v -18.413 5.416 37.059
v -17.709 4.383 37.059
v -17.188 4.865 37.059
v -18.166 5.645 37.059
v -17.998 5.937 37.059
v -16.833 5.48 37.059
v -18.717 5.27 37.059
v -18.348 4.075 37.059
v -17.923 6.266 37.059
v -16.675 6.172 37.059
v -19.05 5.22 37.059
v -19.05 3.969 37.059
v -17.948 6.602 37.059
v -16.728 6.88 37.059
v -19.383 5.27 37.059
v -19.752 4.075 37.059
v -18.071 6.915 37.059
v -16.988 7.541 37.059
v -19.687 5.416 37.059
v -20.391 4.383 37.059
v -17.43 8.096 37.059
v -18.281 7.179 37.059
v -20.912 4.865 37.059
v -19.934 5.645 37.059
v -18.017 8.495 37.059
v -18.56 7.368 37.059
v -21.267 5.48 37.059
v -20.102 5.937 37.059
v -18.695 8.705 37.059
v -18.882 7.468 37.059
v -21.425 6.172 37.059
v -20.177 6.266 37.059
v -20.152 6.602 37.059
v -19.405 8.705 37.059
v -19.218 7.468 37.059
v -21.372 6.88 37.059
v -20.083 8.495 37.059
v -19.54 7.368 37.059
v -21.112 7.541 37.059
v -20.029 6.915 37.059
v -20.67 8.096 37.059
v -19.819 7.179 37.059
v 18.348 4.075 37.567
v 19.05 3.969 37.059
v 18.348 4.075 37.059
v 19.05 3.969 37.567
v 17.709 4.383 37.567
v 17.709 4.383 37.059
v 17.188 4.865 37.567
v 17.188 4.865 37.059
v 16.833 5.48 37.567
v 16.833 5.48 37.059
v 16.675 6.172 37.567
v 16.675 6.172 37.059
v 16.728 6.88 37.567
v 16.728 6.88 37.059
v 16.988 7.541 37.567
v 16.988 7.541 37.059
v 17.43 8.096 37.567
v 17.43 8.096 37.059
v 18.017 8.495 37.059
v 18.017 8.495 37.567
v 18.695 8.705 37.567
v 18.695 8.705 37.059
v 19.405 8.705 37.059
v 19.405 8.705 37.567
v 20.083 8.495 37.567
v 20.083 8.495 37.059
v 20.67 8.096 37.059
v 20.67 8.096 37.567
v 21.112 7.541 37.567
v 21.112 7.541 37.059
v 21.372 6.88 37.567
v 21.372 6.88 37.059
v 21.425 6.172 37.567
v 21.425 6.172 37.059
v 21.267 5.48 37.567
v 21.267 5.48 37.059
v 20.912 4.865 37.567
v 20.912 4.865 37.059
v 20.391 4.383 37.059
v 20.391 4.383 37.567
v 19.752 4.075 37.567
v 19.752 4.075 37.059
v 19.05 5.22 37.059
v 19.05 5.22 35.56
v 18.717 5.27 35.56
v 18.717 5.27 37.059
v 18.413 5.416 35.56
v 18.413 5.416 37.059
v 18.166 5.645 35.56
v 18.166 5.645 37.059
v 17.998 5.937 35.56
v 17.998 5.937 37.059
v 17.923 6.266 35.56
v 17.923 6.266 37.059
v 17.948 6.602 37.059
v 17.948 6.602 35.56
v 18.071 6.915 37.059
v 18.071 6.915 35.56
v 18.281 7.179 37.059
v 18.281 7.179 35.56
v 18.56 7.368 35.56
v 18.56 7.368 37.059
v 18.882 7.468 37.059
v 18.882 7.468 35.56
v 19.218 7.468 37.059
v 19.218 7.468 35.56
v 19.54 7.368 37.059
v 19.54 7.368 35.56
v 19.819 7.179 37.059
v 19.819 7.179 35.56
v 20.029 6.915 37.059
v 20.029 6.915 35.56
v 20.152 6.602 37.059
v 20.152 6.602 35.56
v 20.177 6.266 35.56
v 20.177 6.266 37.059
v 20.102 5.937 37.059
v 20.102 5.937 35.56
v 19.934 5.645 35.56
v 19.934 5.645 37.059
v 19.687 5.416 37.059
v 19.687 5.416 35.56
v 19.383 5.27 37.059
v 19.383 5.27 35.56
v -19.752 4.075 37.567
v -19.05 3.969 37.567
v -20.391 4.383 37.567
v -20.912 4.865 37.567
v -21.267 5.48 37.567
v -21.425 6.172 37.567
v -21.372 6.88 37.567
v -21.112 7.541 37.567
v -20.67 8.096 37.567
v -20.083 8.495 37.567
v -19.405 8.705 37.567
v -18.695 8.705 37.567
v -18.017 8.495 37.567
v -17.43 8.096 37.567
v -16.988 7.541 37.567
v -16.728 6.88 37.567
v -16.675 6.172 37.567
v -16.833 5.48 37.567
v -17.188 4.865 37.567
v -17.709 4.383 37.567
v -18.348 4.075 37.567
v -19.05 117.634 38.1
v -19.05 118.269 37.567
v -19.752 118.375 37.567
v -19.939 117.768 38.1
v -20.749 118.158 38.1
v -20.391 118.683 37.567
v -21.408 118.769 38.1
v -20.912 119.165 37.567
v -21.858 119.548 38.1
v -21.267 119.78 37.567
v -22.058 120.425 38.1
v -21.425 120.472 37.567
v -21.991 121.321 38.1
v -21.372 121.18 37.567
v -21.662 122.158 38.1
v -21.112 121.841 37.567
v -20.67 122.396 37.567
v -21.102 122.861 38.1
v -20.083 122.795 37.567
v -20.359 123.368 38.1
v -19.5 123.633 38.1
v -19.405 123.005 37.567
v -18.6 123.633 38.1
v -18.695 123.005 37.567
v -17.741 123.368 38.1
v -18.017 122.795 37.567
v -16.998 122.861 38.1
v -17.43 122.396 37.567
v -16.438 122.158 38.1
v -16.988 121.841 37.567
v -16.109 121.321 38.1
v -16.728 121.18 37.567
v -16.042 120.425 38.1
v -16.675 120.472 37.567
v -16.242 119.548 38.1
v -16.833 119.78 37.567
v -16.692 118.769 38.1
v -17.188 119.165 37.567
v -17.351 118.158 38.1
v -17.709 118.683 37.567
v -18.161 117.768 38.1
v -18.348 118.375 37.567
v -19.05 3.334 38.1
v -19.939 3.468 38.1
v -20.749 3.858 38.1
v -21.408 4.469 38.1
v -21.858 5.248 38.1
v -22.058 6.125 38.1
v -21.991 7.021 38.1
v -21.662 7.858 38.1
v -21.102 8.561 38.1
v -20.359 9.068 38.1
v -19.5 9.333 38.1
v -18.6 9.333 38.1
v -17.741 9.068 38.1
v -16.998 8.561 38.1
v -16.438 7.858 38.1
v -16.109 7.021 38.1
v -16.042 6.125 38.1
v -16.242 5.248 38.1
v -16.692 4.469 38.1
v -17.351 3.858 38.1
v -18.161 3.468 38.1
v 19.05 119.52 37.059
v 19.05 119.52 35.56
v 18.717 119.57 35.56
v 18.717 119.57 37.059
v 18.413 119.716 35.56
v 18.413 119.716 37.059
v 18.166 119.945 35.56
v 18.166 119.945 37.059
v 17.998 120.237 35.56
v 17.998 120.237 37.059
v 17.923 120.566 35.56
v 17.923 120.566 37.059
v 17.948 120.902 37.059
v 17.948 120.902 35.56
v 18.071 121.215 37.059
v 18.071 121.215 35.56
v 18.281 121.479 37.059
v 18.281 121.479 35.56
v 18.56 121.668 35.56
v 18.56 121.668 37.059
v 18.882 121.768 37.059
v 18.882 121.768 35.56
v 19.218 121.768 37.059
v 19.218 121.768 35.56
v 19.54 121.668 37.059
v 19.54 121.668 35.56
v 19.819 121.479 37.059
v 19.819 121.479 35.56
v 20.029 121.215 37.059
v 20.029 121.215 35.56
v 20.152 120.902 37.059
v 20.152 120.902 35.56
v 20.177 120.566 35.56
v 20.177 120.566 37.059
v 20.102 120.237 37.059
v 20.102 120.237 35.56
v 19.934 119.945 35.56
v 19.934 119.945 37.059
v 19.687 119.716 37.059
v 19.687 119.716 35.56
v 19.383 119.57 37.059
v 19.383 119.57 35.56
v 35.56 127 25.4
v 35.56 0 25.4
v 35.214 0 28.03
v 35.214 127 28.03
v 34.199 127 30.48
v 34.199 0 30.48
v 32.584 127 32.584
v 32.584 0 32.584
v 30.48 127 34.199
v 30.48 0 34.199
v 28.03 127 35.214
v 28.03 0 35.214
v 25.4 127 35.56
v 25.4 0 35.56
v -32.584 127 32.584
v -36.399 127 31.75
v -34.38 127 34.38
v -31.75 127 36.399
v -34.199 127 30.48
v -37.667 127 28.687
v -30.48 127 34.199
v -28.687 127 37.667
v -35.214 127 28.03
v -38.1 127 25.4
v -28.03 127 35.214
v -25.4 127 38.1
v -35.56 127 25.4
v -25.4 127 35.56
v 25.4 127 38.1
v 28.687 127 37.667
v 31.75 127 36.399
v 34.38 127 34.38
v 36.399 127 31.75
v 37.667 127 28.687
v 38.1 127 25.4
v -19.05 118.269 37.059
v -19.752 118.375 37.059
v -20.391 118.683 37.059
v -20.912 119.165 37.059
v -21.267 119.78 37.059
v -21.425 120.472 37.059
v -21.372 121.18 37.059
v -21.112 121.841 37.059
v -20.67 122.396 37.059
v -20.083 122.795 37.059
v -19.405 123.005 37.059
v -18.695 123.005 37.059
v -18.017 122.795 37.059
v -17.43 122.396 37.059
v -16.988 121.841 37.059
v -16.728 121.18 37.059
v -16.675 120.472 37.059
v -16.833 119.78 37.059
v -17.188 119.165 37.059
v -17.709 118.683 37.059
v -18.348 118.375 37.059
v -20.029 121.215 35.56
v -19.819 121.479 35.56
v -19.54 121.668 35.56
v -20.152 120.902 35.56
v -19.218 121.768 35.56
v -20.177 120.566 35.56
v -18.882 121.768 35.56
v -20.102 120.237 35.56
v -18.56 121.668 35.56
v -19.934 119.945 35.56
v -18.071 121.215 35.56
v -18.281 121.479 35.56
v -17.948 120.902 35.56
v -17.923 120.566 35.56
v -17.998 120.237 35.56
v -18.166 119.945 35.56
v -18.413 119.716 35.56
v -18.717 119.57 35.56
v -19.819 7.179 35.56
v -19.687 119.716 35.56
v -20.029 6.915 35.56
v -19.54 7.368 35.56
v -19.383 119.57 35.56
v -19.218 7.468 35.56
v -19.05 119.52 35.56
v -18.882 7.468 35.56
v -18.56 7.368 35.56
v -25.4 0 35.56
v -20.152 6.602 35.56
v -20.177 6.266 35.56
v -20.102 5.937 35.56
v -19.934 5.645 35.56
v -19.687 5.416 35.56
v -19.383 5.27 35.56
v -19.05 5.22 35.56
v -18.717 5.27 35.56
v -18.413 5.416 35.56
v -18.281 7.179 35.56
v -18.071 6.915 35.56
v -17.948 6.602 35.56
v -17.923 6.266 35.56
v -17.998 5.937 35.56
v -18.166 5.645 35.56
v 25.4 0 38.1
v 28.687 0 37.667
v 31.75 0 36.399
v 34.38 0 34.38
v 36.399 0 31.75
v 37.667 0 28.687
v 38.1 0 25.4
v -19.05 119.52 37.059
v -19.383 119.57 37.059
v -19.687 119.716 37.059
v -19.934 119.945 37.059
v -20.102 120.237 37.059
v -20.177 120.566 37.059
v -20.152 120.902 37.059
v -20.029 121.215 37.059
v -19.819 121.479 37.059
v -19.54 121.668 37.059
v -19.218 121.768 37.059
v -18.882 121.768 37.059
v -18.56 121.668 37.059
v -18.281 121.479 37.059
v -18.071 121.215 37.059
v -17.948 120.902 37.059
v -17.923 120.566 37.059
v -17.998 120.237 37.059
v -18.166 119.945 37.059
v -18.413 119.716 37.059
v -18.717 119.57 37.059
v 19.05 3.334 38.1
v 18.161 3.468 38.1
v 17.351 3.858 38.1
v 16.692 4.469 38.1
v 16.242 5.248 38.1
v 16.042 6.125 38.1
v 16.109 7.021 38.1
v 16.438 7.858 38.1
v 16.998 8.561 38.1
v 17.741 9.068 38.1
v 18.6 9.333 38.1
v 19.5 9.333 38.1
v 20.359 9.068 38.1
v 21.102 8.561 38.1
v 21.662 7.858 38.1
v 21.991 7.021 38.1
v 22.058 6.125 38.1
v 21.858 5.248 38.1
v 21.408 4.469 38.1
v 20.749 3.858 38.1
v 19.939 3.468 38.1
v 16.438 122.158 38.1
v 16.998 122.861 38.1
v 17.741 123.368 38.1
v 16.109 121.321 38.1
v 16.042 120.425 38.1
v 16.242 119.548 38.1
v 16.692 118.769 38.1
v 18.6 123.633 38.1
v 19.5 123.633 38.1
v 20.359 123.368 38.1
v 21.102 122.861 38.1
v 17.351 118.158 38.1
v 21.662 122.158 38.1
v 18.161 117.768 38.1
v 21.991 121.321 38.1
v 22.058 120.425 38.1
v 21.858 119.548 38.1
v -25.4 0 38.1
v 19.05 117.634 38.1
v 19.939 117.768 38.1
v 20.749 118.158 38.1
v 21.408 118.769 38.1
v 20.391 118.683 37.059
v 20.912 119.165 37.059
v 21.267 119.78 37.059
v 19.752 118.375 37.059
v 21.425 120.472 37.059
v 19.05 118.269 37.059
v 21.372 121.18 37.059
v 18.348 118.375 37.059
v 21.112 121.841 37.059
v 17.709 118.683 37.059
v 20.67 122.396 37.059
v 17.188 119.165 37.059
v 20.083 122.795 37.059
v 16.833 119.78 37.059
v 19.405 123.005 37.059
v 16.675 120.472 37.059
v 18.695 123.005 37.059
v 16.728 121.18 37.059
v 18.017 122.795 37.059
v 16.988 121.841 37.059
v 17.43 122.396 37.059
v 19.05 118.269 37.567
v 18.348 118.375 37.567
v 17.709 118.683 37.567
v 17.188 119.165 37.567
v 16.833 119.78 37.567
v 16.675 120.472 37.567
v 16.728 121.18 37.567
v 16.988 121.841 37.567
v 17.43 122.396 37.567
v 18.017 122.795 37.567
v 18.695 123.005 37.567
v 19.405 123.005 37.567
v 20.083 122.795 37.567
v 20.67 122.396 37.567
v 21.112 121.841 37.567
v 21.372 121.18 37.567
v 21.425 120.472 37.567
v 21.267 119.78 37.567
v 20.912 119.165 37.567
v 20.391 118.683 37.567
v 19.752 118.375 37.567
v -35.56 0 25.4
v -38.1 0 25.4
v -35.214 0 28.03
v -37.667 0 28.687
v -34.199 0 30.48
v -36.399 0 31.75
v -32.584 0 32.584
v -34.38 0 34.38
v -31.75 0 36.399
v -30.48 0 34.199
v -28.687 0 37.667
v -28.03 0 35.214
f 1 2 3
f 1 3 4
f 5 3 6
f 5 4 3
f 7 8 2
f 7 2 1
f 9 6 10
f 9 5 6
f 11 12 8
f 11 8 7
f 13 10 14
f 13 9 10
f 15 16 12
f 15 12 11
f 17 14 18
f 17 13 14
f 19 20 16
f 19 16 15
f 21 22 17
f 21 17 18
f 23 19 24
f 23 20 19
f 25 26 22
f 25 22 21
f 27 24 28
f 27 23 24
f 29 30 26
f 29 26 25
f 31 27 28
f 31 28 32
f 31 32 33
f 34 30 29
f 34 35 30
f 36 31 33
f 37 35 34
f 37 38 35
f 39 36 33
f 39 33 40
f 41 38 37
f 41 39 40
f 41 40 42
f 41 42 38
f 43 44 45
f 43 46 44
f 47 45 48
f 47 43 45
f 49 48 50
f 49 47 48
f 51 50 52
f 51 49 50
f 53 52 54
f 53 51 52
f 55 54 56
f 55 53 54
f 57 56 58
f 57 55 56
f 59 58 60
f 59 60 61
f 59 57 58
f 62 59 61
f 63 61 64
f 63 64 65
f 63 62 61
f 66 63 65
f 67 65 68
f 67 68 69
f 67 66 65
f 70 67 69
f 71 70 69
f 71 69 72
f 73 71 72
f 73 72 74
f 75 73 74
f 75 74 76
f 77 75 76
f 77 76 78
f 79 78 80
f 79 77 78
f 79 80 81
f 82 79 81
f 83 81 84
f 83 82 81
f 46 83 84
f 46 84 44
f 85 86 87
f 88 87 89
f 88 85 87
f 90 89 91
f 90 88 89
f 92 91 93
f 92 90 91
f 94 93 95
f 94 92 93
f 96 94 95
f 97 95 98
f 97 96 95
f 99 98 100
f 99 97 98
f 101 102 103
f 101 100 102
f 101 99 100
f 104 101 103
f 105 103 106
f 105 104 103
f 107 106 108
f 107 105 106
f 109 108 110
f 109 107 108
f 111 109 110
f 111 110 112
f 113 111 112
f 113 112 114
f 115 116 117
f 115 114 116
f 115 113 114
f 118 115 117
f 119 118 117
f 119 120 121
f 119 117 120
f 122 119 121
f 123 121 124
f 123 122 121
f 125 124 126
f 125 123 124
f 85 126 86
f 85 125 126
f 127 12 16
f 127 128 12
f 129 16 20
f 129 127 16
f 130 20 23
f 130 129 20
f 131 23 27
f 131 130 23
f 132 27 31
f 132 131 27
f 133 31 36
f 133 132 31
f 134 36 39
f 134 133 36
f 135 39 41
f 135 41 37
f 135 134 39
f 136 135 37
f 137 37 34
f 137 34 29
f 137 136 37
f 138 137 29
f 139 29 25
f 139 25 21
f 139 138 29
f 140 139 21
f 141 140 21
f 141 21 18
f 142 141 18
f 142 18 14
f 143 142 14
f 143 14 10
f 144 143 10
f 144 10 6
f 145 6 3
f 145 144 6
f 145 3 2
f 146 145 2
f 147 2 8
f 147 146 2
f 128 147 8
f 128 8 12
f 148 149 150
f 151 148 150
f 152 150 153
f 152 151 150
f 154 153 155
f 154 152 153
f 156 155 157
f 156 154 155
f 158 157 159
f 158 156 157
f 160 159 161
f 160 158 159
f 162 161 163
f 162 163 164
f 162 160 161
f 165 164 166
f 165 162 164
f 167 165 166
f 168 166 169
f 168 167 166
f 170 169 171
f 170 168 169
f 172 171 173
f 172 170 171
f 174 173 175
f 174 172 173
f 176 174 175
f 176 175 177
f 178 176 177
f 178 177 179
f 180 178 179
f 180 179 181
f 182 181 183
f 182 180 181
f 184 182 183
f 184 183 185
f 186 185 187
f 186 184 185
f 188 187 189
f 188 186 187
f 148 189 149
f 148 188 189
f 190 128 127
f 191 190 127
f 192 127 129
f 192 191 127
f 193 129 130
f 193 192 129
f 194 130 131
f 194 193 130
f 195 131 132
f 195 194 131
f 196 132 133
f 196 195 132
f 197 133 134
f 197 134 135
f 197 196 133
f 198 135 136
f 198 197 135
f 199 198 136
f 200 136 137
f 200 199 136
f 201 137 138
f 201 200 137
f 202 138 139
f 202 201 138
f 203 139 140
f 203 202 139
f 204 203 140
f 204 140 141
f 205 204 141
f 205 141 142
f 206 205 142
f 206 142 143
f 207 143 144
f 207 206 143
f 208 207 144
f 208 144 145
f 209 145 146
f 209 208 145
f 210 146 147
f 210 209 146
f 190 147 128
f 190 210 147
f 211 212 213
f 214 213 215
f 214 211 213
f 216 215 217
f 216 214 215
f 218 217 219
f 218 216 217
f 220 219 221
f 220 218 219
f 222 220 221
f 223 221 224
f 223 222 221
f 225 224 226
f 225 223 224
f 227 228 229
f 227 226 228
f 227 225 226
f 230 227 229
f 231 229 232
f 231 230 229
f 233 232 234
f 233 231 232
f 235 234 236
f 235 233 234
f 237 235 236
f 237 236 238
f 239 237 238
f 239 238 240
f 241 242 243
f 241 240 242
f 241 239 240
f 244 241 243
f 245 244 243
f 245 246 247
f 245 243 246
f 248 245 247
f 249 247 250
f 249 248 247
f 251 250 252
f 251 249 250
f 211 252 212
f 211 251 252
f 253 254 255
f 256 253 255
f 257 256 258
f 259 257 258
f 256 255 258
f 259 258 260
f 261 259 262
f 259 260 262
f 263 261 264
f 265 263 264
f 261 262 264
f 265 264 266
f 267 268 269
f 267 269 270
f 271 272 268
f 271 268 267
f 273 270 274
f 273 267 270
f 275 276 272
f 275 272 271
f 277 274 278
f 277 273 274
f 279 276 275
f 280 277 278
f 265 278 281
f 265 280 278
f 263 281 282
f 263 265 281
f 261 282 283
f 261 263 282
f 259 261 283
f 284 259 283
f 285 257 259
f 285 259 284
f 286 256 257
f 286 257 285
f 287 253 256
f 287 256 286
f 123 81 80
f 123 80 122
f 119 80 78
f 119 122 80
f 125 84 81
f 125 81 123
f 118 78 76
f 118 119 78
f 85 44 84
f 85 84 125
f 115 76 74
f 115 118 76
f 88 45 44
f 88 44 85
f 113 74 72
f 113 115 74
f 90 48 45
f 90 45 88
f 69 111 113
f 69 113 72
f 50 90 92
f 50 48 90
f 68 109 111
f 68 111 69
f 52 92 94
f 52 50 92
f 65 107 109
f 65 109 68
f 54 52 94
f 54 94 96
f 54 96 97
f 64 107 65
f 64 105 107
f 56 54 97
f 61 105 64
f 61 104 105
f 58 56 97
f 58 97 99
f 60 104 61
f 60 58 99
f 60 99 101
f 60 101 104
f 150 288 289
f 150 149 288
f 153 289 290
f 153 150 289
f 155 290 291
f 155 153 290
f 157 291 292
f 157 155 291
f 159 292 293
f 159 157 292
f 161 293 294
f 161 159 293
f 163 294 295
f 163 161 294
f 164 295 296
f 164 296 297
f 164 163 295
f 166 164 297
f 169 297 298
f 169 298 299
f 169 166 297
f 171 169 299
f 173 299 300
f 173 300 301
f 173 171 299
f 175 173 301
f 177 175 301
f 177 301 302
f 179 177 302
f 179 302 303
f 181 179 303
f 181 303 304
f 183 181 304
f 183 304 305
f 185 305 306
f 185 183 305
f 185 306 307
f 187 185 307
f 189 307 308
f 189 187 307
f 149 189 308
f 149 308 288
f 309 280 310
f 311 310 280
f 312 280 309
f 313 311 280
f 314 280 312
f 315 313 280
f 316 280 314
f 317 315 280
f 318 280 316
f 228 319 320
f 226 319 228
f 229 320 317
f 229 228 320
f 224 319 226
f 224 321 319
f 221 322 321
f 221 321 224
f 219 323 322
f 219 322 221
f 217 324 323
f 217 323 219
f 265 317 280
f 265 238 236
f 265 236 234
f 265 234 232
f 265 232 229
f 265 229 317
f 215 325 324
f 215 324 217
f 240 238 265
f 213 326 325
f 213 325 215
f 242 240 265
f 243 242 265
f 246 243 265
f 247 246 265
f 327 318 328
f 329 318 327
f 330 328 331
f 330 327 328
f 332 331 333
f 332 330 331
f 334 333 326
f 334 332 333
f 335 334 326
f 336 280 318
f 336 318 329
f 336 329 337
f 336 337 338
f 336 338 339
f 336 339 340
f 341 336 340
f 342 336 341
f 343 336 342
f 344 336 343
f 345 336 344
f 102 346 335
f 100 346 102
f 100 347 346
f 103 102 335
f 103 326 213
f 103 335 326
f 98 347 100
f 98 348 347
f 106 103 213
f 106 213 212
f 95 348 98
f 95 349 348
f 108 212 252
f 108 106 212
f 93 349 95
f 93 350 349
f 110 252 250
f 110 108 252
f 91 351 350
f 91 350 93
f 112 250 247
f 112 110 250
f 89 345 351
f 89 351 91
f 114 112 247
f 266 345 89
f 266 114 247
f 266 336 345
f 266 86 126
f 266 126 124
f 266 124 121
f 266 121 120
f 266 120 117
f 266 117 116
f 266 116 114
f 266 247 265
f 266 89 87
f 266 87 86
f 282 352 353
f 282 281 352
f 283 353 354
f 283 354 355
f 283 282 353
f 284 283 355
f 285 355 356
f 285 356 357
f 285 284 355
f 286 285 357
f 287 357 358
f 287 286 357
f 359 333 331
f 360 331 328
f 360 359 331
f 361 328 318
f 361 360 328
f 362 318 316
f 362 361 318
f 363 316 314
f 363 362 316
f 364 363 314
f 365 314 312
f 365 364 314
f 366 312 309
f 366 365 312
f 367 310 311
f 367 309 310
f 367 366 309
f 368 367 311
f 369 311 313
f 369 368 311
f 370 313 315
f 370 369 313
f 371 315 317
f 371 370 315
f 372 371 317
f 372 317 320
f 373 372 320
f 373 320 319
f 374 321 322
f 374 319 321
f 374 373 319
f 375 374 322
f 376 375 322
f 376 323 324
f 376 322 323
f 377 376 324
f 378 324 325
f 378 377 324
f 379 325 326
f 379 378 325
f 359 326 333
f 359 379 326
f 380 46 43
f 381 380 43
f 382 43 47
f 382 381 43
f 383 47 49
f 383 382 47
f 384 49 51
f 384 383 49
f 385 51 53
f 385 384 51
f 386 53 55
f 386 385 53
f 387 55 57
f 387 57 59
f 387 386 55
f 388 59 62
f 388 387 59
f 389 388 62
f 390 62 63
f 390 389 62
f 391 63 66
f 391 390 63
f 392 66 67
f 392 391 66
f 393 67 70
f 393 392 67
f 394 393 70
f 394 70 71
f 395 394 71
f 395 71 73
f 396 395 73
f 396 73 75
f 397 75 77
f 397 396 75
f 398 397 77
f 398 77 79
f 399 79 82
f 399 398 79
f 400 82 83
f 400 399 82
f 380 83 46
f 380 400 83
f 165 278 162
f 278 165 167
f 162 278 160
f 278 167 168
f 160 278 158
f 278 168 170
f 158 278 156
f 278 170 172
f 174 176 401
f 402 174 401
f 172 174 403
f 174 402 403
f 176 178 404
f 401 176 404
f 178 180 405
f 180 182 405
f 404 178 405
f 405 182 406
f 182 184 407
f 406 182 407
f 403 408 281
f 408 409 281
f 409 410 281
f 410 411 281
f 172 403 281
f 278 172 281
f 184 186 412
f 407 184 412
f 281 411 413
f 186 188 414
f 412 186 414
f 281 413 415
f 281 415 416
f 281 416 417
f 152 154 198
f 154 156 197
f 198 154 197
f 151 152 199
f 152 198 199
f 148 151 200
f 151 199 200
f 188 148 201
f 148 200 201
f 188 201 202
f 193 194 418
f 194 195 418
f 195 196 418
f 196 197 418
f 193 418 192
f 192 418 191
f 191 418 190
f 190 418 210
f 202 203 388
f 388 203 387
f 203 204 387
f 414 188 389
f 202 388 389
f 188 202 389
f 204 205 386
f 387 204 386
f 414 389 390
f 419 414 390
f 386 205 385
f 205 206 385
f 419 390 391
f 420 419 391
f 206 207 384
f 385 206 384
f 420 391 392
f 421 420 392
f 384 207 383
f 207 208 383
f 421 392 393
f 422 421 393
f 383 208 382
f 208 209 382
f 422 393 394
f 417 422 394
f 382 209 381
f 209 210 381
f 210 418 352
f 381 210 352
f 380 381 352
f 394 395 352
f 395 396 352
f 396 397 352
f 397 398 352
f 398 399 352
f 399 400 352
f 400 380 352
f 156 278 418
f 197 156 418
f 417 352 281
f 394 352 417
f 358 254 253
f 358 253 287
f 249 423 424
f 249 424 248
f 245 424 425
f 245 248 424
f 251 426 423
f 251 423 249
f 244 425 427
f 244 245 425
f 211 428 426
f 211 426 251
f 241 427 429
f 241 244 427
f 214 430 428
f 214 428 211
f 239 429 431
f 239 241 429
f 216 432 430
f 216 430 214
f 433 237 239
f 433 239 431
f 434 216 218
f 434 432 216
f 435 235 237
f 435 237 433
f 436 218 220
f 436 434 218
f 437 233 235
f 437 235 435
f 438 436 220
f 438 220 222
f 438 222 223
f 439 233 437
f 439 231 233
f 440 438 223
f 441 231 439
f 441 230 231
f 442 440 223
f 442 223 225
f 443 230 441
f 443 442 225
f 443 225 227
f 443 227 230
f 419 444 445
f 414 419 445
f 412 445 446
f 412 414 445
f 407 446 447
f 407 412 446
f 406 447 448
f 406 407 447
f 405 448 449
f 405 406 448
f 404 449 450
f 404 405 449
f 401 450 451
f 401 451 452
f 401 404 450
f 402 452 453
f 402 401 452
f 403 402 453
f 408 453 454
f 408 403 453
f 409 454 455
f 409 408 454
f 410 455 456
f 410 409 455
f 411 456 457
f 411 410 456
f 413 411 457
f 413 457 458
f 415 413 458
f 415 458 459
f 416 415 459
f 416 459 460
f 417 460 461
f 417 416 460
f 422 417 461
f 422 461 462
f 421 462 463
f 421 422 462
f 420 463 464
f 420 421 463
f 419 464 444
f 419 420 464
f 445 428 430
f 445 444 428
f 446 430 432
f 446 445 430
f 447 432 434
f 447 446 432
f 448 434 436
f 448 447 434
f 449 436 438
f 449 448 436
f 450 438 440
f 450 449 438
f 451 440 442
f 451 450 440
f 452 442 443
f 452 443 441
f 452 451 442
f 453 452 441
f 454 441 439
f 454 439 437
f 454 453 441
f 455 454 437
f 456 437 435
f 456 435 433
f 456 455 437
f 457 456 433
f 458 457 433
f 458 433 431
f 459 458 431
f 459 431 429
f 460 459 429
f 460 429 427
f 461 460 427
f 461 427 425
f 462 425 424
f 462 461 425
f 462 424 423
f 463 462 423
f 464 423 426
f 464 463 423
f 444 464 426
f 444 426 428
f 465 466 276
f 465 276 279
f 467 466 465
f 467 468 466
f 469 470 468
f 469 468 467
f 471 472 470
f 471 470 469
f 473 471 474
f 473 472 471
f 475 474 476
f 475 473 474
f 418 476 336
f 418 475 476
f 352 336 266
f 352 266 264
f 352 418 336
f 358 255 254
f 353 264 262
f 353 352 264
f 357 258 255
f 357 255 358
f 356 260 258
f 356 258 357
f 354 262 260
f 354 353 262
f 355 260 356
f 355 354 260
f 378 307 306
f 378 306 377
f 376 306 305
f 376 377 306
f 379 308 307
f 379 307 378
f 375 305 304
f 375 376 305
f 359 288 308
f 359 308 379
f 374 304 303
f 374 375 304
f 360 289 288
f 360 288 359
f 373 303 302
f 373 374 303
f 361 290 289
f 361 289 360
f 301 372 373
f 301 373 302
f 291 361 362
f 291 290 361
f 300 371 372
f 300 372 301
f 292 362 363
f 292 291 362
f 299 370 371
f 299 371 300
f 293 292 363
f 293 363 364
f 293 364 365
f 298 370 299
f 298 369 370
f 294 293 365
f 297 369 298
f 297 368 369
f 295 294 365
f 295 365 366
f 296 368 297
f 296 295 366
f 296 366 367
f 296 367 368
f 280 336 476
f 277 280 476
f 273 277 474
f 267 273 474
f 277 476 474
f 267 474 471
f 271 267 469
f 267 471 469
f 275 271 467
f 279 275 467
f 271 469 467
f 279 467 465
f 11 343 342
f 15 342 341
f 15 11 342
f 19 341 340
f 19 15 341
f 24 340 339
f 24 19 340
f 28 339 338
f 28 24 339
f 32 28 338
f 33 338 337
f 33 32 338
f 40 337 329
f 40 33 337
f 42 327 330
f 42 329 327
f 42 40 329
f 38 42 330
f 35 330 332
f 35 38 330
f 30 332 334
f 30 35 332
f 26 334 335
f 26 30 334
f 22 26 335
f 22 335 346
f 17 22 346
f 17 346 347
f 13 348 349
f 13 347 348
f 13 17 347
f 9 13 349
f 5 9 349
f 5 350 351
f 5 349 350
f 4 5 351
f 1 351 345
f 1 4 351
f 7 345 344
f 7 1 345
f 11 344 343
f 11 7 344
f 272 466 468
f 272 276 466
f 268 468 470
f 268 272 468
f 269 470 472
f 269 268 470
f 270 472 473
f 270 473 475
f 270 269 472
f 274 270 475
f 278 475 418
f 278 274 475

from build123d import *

# Parameters (mm, degrees)
SKETCH1_W                                   = 76.2
SKETCH1_H                                   = 76.2
BOSS_EXTRUDE1_DEPTH                         = 127
FILLET1_R                                   = 12.7
SKETCH2_W                                   = 76.2
SKETCH2_H                                   = 12.7
BOSS_EXTRUDE6_DEPTH                         = 57.15
CUT_EXTRUDE2_DEPTH                          = 12.7
CUT_EXTRUDE4_START                          = -254
CUT_EXTRUDE4_DEPTH                          = 254
SKETCH7_W                                   = 50.8
SKETCH7_H                                   = 10.16
CUT_EXTRUDE7_DEPTH                          = 124.46
CUT_EXTRUDE8_DEPTH                          = 114.3
BOSS_EXTRUDE7_DEPTH                         = 12.7
CUT_EXTRUDE9_DEPTH                          = 127
CBORE_FOR_1_BINDING_HEAD_MACHINE_SC_2_COUNT = 2
CBORE_FOR_1_BINDING_HEAD_MACHINE_SC_2_PITCH = 38.1
CBORE_FOR_1_BINDING_HEAD_MACHINE_SC_3_COUNT = 2
CBORE_FOR_1_BINDING_HEAD_MACHINE_SC_3_PITCH = 114.3
CBORE_FOR_1_BINDING_HEAD_MACHINE_SC_4_COUNT = 2
CBORE_FOR_1_BINDING_HEAD_MACHINE_SC_4_PITCH = 120.482778852


with BuildPart() as part:
    # Sketch1 → Boss-Extrude1 (new body)
    with BuildSketch(Plane(origin=(0, 0, 0), x_dir=(1, 0, 0), z_dir=(0, 1, 0))):
        Rectangle(SKETCH1_W, SKETCH1_H)
    extrude(amount=BOSS_EXTRUDE1_DEPTH)

    # Fillet1
    fillet1_edges = [part.edges().sort_by_distance(p)[0] for p in [
        (38.1, 63.5, 38.1),
        (38.1, 63.5, -38.1),
        (-38.1, 63.5, -38.1),
        (-38.1, 63.5, 38.1),
    ]]
    fillet(fillet1_edges, radius=FILLET1_R)

    # Sketch2 → Boss-Extrude6 (add)
    with BuildSketch(Plane(origin=(0, 127, 0), x_dir=(1, 0, 0), z_dir=(0, 1, 0))):
        Rectangle(SKETCH2_W, SKETCH2_H)
    extrude(amount=BOSS_EXTRUDE6_DEPTH)

    # Sketch5 → Cut-Extrude2 (cut)
    with BuildSketch(Plane.XY.offset(6.35)):
        with BuildLine():
            ThreePointArc((27.94, 127), (0, 146.05), (-27.94, 127))
            Line((-27.94, 127), (27.94, 127))
        make_face()
        with BuildLine():
            Line((-27.94, 146.05), (-27.94, 132.743180509))
            ThreePointArc((-27.94, 132.743180509), (-21.337126939, 140.622484939), (-12.60652265, 146.05))
            Line((-12.60652265, 146.05), (-27.94, 146.05))
        make_face()
        with BuildLine():
            ThreePointArc((12.60652265, 146.05), (21.337126939, 140.622484939), (27.94, 132.743180509))
            Line((27.94, 132.743180509), (27.94, 146.05))
            Line((27.94, 146.05), (12.60652265, 146.05))
        make_face()
        with BuildLine():
            Line((-38.1, 184.15), (-38.1, 146.05))
            ThreePointArc((-38.1, 146.05), (-26.940768363, 172.990768363), (0, 184.15))
            Line((0, 184.15), (-38.1, 184.15))
        make_face()
        with BuildLine():
            ThreePointArc((0, 184.15), (26.940768363, 172.990768363), (38.1, 146.05))
            Line((38.1, 146.05), (38.1, 184.15))
            Line((38.1, 184.15), (0, 184.15))
        make_face()
        with BuildLine():
            Line((-27.186811297, 152.493670653), (27.186811297, 152.493670653))
            ThreePointArc((27.186811297, 152.493670653), (0, 173.99), (-27.186811297, 152.493670653))
        make_face()
    extrude(amount=-CUT_EXTRUDE2_DEPTH, mode=Mode.SUBTRACT)

    # Sketch6 → Cut-Extrude4 (cut)
    with BuildSketch(Plane.XZ.offset(CUT_EXTRUDE4_START)):
        with BuildLine():
            Line((-38.1, 25.4), (-38.1, -25.4))
            ThreePointArc((-38.1, -25.4), (-34.380256121, -34.380256121), (-25.4, -38.1))
            Line((-25.4, -38.1), (25.4, -38.1))
            ThreePointArc((25.4, -38.1), (34.380256121, -34.380256121), (38.1, -25.4))
            Line((38.1, -25.4), (38.1, 25.4))
            Line((38.1, 25.4), (-38.1, 25.4))
        make_face()
    extrude(amount=CUT_EXTRUDE4_DEPTH, mode=Mode.SUBTRACT)

    # Sketch7 → Cut-Extrude7 (cut)
    with BuildSketch(Plane.XZ):
        with Locations((0, 30.48)):
            Rectangle(SKETCH7_W, SKETCH7_H)
    extrude(amount=-CUT_EXTRUDE7_DEPTH, mode=Mode.SUBTRACT)

    # Sketch7<6> → Cut-Extrude8 (cut)
    with BuildSketch(Plane.XZ):
        with BuildLine():
            ThreePointArc((-25.4, 35.56), (-32.584204897, 32.584204897), (-35.56, 25.4))
            Line((-35.56, 25.4), (-25.4, 25.4))
            Line((-25.4, 25.4), (-25.4, 35.56))
        make_face()
        with BuildLine():
            Line((25.4, 35.56), (25.4, 25.4))
            Line((25.4, 25.4), (35.56, 25.4))
            ThreePointArc((35.56, 25.4), (32.584204897, 32.584204897), (25.4, 35.56))
        make_face()
    extrude(amount=-CUT_EXTRUDE8_DEPTH, mode=Mode.SUBTRACT)

    # Sketch7<7> → Boss-Extrude7 (add)
    with BuildSketch(Plane.XZ):
        with BuildLine():
            ThreePointArc((-25.4, 35.56), (-32.584204897, 32.584204897), (-35.56, 25.4))
            Line((-35.56, 25.4), (-25.4, 25.4))
            Line((-25.4, 25.4), (-25.4, 35.56))
        make_face()
        with BuildLine():
            Line((25.4, 35.56), (25.4, 25.4))
            Line((25.4, 25.4), (35.56, 25.4))
            ThreePointArc((35.56, 25.4), (32.584204897, 32.584204897), (25.4, 35.56))
        make_face()
    extrude(amount=-BOSS_EXTRUDE7_DEPTH)

    # Sketch7<8> → Cut-Extrude9 (cut)
    with BuildSketch(Plane.XZ):
        with BuildLine():
            ThreePointArc((-25.4, 35.56), (-32.584204897, 32.584204897), (-35.56, 25.4))
            Line((-35.56, 25.4), (35.56, 25.4))
            ThreePointArc((35.56, 25.4), (32.584204897, 32.584204897), (25.4, 35.56))
            Line((25.4, 35.56), (-25.4, 35.56))
        make_face()
    extrude(amount=-CUT_EXTRUDE9_DEPTH, mode=Mode.SUBTRACT)

    # Sketch12 → CBORE for #1 Binding Head Machine Screw1 (revolve, cut)
    with BuildSketch(Plane(origin=(-19.05, 120.65, 38.1), x_dir=(0, -1, 0), z_dir=(1, 0, 0))):
        Polygon((0, 0), (0, 10.839152758), (1.1303, 10.16), (1.1303, 1.0414), (2.38125, 1.0414), (2.38125, 0.532828266), (3.01625, 0), align=None)
    cbore_for_1_binding_head_machine_screw1 = revolve(axis=Axis((-19.05, 120.65, 44.45), (0, 0, -1)), mode=Mode.SUBTRACT)

    # CBORE for _1 Binding Head Machine Sc 2: CBORE for #1 Binding Head Machine Screw1 ×2
    with Locations(*[(i * CBORE_FOR_1_BINDING_HEAD_MACHINE_SC_2_PITCH, 0, 0) for i in range(1, CBORE_FOR_1_BINDING_HEAD_MACHINE_SC_2_COUNT)]):
        add(cbore_for_1_binding_head_machine_screw1, mode=Mode.SUBTRACT)

    # CBORE for _1 Binding Head Machine Sc 3: CBORE for #1 Binding Head Machine Screw1 ×2
    with Locations(*[(0, -i * CBORE_FOR_1_BINDING_HEAD_MACHINE_SC_3_PITCH, 0) for i in range(1, CBORE_FOR_1_BINDING_HEAD_MACHINE_SC_3_COUNT)]):
        add(cbore_for_1_binding_head_machine_screw1, mode=Mode.SUBTRACT)

    # CBORE for _1 Binding Head Machine Sc 4: CBORE for #1 Binding Head Machine Screw1 ×2
    with Locations(*[Vector(0.3162277660168378, -0.9486832980505139, 0) * (i * CBORE_FOR_1_BINDING_HEAD_MACHINE_SC_4_PITCH) for i in range(1, CBORE_FOR_1_BINDING_HEAD_MACHINE_SC_4_COUNT)]):
        add(cbore_for_1_binding_head_machine_screw1, mode=Mode.SUBTRACT)


solid = part.part
